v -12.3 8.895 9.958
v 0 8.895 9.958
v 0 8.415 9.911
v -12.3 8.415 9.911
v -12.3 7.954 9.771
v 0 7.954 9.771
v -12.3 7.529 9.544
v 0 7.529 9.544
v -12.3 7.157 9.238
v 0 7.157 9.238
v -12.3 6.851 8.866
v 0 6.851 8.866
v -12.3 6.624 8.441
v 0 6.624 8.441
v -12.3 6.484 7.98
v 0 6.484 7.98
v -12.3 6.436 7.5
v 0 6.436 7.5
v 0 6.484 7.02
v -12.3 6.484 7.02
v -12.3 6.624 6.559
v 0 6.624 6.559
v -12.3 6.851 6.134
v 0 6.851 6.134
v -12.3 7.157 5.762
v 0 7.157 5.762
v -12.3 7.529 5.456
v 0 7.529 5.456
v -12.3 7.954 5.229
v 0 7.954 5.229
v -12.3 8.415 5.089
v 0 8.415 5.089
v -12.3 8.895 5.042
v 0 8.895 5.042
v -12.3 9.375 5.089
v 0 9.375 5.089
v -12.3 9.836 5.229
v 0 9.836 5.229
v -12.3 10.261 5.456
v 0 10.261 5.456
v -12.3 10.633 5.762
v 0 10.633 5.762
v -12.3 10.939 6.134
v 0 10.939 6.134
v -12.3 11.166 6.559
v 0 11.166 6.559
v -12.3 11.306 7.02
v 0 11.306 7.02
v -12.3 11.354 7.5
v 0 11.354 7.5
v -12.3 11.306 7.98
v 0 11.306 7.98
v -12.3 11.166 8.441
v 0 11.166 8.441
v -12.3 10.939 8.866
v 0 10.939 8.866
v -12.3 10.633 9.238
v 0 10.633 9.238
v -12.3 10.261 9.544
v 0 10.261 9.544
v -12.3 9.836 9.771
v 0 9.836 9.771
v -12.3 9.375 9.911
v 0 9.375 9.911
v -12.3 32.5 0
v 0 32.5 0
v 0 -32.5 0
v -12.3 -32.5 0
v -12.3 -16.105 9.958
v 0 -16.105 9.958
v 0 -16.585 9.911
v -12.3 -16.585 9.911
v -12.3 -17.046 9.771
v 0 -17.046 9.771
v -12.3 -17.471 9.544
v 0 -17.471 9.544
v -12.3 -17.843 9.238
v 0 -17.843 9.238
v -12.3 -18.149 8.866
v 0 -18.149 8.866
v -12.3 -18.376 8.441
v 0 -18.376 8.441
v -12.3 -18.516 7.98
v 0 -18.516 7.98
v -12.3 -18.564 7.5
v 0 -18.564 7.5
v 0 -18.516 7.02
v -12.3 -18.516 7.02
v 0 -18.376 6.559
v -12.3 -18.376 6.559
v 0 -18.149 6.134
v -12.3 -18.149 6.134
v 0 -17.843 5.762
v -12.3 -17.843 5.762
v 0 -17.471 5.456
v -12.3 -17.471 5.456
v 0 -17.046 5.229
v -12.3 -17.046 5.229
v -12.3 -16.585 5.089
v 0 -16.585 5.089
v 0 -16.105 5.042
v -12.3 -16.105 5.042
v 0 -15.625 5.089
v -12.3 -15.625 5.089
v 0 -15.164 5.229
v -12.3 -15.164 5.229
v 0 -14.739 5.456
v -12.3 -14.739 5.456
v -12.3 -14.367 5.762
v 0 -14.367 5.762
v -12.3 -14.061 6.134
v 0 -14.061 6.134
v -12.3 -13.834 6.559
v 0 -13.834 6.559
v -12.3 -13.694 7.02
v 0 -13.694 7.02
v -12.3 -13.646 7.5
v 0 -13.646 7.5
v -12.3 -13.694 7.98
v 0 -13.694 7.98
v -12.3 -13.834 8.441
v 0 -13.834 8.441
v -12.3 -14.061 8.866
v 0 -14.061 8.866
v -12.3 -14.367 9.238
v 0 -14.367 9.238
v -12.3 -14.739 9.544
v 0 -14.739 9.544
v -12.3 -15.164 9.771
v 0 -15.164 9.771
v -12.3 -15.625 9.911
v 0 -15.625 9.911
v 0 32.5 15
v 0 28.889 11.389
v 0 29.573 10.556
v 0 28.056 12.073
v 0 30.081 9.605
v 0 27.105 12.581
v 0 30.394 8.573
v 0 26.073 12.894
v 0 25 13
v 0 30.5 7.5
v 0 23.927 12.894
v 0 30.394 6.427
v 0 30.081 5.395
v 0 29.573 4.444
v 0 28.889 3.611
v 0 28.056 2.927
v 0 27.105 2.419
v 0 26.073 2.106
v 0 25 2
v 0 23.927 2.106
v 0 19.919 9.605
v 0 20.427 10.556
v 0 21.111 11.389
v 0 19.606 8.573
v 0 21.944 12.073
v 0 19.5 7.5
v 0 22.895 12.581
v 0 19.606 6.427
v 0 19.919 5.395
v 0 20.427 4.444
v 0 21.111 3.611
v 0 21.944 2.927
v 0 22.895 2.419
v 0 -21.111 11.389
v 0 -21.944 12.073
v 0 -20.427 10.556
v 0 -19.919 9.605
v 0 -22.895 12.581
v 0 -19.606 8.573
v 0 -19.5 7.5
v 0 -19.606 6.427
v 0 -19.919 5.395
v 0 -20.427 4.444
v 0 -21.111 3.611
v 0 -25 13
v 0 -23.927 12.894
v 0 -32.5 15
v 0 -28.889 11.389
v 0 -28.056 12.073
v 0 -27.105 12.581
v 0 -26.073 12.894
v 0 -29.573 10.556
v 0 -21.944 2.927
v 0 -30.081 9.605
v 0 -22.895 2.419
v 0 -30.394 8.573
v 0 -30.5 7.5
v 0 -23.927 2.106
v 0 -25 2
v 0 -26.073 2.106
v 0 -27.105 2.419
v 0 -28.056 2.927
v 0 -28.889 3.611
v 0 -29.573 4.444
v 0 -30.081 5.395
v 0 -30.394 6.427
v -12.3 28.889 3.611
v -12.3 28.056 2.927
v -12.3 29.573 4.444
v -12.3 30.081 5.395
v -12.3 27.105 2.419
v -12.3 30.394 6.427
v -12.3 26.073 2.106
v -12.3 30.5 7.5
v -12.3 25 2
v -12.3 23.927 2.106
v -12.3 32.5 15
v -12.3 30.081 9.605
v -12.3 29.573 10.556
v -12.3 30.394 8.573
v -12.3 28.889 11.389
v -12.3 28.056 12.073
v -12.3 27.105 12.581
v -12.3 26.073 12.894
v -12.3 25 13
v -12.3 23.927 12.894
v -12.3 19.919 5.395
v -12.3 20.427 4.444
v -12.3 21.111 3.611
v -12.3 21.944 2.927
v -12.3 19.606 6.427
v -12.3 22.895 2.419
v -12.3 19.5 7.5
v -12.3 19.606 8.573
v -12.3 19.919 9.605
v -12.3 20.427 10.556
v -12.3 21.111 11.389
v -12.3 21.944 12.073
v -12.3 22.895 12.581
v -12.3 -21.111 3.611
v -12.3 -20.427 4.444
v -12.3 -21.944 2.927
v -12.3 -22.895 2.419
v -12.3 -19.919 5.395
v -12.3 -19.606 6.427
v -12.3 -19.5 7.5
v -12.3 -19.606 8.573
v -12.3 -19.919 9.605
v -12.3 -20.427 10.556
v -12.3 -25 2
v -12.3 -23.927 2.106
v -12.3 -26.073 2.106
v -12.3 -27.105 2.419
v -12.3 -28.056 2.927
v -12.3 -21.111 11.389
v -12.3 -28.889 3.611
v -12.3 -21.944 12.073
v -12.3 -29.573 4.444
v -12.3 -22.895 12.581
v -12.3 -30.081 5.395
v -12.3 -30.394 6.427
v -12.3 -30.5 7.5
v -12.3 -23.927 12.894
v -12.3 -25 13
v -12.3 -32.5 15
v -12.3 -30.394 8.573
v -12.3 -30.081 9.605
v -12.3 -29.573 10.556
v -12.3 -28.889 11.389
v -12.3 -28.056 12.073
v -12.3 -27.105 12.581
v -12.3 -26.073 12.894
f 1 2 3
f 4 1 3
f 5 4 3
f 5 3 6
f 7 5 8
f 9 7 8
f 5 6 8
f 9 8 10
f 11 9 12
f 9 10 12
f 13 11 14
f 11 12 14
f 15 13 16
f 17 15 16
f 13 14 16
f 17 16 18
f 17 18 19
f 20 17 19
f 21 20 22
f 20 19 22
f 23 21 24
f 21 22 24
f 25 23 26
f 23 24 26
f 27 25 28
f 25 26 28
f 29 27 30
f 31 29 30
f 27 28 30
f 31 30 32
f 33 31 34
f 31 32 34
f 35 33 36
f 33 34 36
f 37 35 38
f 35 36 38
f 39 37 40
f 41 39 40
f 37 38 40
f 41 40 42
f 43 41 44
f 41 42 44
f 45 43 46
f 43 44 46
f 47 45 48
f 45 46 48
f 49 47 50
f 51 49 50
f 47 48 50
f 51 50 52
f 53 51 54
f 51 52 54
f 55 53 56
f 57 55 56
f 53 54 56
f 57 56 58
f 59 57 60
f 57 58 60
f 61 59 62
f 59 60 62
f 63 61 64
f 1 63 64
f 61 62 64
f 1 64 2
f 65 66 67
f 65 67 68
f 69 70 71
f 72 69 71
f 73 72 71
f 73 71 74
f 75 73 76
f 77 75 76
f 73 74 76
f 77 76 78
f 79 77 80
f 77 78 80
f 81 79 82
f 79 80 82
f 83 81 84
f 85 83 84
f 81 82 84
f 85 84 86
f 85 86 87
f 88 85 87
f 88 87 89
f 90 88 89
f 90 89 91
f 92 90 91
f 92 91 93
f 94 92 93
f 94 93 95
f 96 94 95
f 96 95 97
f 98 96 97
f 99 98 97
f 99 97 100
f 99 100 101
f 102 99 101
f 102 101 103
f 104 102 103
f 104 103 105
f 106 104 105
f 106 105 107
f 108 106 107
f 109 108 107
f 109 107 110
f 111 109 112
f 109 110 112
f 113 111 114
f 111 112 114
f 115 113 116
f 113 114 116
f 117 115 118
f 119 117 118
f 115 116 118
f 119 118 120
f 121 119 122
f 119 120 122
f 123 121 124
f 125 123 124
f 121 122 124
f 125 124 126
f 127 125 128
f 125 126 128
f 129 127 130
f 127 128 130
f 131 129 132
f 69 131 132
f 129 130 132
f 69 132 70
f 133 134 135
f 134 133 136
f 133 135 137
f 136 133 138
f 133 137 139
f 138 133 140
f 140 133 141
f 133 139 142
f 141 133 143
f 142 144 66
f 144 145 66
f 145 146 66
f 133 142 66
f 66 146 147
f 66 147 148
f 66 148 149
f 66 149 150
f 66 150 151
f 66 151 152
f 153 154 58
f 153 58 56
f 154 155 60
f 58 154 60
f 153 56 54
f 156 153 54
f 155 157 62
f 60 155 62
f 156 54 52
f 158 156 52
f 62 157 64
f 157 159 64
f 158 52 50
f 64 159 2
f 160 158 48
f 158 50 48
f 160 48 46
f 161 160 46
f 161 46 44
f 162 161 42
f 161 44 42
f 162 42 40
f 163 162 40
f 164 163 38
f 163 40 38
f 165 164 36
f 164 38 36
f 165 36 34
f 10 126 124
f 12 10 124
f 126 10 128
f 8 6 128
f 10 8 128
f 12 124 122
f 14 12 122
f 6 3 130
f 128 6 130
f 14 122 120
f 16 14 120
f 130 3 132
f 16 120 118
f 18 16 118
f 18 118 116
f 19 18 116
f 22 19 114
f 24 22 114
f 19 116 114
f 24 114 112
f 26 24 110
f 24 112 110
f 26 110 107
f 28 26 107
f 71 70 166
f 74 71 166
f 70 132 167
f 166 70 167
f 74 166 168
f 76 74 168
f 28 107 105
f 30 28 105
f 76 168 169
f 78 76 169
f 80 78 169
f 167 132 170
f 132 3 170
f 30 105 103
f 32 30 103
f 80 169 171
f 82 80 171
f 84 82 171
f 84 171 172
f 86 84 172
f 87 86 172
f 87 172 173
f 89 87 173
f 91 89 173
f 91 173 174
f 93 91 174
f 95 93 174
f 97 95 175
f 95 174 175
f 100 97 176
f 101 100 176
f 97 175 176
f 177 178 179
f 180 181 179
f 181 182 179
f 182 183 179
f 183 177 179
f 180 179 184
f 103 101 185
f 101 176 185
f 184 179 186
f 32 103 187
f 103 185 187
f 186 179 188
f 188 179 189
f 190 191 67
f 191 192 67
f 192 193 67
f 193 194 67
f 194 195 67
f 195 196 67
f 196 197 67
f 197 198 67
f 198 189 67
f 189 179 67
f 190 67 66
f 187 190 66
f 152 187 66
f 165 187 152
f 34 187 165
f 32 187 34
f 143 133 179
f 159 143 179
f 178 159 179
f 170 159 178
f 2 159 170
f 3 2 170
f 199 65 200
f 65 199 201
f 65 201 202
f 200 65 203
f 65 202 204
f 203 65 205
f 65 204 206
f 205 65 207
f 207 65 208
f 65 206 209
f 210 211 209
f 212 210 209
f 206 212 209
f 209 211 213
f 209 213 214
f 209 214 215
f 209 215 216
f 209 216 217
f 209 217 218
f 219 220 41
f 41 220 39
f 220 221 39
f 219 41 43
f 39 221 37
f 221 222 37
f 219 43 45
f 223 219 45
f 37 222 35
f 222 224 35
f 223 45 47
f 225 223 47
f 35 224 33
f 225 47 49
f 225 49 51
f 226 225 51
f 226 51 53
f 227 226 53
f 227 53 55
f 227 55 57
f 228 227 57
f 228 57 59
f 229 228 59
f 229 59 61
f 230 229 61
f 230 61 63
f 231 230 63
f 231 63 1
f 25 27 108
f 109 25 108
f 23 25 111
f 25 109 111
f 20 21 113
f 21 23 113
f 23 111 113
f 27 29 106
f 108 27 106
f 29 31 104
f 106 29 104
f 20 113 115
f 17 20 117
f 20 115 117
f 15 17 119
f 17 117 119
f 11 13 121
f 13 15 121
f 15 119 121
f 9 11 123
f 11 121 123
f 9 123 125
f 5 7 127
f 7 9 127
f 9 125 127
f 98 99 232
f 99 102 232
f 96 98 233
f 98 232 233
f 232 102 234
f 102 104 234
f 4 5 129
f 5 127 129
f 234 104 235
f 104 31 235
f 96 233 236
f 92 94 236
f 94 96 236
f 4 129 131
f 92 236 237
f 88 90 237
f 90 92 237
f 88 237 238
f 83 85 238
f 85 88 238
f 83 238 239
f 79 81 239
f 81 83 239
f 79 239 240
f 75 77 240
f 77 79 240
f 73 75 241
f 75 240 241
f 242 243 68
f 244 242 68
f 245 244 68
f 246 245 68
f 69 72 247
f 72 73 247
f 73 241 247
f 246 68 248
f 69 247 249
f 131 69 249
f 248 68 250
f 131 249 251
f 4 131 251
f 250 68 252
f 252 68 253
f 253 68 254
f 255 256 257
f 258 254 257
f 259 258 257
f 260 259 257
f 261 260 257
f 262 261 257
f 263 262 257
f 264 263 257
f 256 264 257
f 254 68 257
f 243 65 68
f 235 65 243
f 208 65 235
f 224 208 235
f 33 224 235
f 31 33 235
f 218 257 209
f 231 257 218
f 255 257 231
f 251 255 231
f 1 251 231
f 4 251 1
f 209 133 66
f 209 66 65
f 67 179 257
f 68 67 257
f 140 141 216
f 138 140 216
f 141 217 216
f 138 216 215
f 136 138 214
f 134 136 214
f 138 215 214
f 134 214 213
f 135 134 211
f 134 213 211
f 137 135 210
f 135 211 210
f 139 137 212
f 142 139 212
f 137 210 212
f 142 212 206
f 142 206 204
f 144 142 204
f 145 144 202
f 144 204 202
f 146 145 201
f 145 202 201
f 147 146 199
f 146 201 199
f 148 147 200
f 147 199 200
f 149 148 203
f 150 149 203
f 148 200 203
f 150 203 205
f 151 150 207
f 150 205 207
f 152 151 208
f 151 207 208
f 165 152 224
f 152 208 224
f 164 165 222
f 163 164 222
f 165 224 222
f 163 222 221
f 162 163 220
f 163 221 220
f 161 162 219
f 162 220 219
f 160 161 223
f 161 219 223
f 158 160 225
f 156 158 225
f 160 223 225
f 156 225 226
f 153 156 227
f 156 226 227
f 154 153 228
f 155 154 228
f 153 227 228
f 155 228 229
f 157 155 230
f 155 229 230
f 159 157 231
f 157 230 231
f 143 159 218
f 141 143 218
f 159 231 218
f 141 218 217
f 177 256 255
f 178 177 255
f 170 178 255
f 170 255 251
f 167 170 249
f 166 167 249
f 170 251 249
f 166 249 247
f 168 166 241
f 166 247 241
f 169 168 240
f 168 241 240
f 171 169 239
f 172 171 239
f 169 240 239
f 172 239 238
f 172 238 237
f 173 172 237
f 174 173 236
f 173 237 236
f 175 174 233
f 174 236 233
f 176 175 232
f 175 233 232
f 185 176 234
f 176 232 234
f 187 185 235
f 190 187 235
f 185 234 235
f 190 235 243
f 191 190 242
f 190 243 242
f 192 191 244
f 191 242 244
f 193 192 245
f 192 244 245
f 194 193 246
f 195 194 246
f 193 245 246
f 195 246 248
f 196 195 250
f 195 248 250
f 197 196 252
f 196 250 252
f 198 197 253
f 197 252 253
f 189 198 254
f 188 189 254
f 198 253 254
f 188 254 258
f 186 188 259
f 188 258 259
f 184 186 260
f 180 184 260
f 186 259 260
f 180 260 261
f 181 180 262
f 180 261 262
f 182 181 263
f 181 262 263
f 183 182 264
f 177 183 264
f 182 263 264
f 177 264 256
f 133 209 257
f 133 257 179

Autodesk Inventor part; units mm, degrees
ref_plane "YZ Plane" through (0, 0, 0) normal (1, 0, 0) x (0, 1, 0)
ref_plane "XZ Plane" through (0, 0, 0) normal (0, 1, 0) x (-1, 0, 0)
ref_plane "XY Plane" through (0, 0, 0) normal (0, 0, 1) x (1, 0, 0)
sketch "Sketch1" plane through (0, 0, 0) normal (0, 1, 0) x (-1, 0, 0)
  line L0 (0, 0) -> (12.3, 0)
  line L1 (12.3, 0) -> (12.3, 15)
  line L2 (12.3, 15) -> (0, 15)
  line L3 (0, 15) -> (0, 0)
  dimension "d0" = 15
  dimension "d1" = 12.3
extrude "Extrusion1" add sketch "Sketch1" along normal mid plane 65
sketch "Sketch2" plane through (-12.3, -32.5, 15) normal (-1, 0, 0) x (0, 0, 1)
  circle A0 centre (-7.5, 7.5) radius 3.25
  circle A1 centre (-7.5, 57.5) radius 3.25
  circle A2 centre (-7.5, 7.5) radius 5.5
  circle A3 centre (-7.5, 57.5) radius 5.5
  line L0 (0, 0) -> (-15, 0) projected
  line L1 (-15, 32.5) -> (12.3047, 32.5) construction
  dimension "d4" = 6.5
  dimension "d5" = 6.5
  dimension "d8" = 11
  dimension "d9" = 11
  dimension "d26" = 25
  dimension "d27" = 25
extrude "Extrusion2" cut sketch "Sketch2" against normal through all contours A0 | A1
extrude "Extrusion3" cut sketch "Sketch2" against normal blind 21.3
sketch "Sketch3" plane through (-12.3, -32.5, 15) normal (-1, 0, 0) x (0, 0, 1)
  circle A0 centre (-7.5, 16.395) radius 3
  line L0 (0, 0) -> (-15, 0) projected
  circle A1 centre (-7.5, 41.395) radius 3
  point P0 (-15, 32.5)
  dimension "d14" = 6
  dimension "d22" = 16.395
  dimension "d23" = 6
  dimension "d24" = 25
hole "Hole1" at (-12.3, -16.105, 7.5) at (-12.3, 8.895, 7.5) direction (1, 0, 0) diameter 4.917 depth 15.1 tip angle 118 thread size "M6x1" class "6H" standard "ANSI Metric M Profile"
sketch "Sketch4" plane through (-12.3, -32.5, 15) normal (-1, 0, 0) x (0, 0, 1)
  point P0 (-15, 32.5)
properties part number "HeadbarHolderBracket_v2" material "Aluminum 6061"
